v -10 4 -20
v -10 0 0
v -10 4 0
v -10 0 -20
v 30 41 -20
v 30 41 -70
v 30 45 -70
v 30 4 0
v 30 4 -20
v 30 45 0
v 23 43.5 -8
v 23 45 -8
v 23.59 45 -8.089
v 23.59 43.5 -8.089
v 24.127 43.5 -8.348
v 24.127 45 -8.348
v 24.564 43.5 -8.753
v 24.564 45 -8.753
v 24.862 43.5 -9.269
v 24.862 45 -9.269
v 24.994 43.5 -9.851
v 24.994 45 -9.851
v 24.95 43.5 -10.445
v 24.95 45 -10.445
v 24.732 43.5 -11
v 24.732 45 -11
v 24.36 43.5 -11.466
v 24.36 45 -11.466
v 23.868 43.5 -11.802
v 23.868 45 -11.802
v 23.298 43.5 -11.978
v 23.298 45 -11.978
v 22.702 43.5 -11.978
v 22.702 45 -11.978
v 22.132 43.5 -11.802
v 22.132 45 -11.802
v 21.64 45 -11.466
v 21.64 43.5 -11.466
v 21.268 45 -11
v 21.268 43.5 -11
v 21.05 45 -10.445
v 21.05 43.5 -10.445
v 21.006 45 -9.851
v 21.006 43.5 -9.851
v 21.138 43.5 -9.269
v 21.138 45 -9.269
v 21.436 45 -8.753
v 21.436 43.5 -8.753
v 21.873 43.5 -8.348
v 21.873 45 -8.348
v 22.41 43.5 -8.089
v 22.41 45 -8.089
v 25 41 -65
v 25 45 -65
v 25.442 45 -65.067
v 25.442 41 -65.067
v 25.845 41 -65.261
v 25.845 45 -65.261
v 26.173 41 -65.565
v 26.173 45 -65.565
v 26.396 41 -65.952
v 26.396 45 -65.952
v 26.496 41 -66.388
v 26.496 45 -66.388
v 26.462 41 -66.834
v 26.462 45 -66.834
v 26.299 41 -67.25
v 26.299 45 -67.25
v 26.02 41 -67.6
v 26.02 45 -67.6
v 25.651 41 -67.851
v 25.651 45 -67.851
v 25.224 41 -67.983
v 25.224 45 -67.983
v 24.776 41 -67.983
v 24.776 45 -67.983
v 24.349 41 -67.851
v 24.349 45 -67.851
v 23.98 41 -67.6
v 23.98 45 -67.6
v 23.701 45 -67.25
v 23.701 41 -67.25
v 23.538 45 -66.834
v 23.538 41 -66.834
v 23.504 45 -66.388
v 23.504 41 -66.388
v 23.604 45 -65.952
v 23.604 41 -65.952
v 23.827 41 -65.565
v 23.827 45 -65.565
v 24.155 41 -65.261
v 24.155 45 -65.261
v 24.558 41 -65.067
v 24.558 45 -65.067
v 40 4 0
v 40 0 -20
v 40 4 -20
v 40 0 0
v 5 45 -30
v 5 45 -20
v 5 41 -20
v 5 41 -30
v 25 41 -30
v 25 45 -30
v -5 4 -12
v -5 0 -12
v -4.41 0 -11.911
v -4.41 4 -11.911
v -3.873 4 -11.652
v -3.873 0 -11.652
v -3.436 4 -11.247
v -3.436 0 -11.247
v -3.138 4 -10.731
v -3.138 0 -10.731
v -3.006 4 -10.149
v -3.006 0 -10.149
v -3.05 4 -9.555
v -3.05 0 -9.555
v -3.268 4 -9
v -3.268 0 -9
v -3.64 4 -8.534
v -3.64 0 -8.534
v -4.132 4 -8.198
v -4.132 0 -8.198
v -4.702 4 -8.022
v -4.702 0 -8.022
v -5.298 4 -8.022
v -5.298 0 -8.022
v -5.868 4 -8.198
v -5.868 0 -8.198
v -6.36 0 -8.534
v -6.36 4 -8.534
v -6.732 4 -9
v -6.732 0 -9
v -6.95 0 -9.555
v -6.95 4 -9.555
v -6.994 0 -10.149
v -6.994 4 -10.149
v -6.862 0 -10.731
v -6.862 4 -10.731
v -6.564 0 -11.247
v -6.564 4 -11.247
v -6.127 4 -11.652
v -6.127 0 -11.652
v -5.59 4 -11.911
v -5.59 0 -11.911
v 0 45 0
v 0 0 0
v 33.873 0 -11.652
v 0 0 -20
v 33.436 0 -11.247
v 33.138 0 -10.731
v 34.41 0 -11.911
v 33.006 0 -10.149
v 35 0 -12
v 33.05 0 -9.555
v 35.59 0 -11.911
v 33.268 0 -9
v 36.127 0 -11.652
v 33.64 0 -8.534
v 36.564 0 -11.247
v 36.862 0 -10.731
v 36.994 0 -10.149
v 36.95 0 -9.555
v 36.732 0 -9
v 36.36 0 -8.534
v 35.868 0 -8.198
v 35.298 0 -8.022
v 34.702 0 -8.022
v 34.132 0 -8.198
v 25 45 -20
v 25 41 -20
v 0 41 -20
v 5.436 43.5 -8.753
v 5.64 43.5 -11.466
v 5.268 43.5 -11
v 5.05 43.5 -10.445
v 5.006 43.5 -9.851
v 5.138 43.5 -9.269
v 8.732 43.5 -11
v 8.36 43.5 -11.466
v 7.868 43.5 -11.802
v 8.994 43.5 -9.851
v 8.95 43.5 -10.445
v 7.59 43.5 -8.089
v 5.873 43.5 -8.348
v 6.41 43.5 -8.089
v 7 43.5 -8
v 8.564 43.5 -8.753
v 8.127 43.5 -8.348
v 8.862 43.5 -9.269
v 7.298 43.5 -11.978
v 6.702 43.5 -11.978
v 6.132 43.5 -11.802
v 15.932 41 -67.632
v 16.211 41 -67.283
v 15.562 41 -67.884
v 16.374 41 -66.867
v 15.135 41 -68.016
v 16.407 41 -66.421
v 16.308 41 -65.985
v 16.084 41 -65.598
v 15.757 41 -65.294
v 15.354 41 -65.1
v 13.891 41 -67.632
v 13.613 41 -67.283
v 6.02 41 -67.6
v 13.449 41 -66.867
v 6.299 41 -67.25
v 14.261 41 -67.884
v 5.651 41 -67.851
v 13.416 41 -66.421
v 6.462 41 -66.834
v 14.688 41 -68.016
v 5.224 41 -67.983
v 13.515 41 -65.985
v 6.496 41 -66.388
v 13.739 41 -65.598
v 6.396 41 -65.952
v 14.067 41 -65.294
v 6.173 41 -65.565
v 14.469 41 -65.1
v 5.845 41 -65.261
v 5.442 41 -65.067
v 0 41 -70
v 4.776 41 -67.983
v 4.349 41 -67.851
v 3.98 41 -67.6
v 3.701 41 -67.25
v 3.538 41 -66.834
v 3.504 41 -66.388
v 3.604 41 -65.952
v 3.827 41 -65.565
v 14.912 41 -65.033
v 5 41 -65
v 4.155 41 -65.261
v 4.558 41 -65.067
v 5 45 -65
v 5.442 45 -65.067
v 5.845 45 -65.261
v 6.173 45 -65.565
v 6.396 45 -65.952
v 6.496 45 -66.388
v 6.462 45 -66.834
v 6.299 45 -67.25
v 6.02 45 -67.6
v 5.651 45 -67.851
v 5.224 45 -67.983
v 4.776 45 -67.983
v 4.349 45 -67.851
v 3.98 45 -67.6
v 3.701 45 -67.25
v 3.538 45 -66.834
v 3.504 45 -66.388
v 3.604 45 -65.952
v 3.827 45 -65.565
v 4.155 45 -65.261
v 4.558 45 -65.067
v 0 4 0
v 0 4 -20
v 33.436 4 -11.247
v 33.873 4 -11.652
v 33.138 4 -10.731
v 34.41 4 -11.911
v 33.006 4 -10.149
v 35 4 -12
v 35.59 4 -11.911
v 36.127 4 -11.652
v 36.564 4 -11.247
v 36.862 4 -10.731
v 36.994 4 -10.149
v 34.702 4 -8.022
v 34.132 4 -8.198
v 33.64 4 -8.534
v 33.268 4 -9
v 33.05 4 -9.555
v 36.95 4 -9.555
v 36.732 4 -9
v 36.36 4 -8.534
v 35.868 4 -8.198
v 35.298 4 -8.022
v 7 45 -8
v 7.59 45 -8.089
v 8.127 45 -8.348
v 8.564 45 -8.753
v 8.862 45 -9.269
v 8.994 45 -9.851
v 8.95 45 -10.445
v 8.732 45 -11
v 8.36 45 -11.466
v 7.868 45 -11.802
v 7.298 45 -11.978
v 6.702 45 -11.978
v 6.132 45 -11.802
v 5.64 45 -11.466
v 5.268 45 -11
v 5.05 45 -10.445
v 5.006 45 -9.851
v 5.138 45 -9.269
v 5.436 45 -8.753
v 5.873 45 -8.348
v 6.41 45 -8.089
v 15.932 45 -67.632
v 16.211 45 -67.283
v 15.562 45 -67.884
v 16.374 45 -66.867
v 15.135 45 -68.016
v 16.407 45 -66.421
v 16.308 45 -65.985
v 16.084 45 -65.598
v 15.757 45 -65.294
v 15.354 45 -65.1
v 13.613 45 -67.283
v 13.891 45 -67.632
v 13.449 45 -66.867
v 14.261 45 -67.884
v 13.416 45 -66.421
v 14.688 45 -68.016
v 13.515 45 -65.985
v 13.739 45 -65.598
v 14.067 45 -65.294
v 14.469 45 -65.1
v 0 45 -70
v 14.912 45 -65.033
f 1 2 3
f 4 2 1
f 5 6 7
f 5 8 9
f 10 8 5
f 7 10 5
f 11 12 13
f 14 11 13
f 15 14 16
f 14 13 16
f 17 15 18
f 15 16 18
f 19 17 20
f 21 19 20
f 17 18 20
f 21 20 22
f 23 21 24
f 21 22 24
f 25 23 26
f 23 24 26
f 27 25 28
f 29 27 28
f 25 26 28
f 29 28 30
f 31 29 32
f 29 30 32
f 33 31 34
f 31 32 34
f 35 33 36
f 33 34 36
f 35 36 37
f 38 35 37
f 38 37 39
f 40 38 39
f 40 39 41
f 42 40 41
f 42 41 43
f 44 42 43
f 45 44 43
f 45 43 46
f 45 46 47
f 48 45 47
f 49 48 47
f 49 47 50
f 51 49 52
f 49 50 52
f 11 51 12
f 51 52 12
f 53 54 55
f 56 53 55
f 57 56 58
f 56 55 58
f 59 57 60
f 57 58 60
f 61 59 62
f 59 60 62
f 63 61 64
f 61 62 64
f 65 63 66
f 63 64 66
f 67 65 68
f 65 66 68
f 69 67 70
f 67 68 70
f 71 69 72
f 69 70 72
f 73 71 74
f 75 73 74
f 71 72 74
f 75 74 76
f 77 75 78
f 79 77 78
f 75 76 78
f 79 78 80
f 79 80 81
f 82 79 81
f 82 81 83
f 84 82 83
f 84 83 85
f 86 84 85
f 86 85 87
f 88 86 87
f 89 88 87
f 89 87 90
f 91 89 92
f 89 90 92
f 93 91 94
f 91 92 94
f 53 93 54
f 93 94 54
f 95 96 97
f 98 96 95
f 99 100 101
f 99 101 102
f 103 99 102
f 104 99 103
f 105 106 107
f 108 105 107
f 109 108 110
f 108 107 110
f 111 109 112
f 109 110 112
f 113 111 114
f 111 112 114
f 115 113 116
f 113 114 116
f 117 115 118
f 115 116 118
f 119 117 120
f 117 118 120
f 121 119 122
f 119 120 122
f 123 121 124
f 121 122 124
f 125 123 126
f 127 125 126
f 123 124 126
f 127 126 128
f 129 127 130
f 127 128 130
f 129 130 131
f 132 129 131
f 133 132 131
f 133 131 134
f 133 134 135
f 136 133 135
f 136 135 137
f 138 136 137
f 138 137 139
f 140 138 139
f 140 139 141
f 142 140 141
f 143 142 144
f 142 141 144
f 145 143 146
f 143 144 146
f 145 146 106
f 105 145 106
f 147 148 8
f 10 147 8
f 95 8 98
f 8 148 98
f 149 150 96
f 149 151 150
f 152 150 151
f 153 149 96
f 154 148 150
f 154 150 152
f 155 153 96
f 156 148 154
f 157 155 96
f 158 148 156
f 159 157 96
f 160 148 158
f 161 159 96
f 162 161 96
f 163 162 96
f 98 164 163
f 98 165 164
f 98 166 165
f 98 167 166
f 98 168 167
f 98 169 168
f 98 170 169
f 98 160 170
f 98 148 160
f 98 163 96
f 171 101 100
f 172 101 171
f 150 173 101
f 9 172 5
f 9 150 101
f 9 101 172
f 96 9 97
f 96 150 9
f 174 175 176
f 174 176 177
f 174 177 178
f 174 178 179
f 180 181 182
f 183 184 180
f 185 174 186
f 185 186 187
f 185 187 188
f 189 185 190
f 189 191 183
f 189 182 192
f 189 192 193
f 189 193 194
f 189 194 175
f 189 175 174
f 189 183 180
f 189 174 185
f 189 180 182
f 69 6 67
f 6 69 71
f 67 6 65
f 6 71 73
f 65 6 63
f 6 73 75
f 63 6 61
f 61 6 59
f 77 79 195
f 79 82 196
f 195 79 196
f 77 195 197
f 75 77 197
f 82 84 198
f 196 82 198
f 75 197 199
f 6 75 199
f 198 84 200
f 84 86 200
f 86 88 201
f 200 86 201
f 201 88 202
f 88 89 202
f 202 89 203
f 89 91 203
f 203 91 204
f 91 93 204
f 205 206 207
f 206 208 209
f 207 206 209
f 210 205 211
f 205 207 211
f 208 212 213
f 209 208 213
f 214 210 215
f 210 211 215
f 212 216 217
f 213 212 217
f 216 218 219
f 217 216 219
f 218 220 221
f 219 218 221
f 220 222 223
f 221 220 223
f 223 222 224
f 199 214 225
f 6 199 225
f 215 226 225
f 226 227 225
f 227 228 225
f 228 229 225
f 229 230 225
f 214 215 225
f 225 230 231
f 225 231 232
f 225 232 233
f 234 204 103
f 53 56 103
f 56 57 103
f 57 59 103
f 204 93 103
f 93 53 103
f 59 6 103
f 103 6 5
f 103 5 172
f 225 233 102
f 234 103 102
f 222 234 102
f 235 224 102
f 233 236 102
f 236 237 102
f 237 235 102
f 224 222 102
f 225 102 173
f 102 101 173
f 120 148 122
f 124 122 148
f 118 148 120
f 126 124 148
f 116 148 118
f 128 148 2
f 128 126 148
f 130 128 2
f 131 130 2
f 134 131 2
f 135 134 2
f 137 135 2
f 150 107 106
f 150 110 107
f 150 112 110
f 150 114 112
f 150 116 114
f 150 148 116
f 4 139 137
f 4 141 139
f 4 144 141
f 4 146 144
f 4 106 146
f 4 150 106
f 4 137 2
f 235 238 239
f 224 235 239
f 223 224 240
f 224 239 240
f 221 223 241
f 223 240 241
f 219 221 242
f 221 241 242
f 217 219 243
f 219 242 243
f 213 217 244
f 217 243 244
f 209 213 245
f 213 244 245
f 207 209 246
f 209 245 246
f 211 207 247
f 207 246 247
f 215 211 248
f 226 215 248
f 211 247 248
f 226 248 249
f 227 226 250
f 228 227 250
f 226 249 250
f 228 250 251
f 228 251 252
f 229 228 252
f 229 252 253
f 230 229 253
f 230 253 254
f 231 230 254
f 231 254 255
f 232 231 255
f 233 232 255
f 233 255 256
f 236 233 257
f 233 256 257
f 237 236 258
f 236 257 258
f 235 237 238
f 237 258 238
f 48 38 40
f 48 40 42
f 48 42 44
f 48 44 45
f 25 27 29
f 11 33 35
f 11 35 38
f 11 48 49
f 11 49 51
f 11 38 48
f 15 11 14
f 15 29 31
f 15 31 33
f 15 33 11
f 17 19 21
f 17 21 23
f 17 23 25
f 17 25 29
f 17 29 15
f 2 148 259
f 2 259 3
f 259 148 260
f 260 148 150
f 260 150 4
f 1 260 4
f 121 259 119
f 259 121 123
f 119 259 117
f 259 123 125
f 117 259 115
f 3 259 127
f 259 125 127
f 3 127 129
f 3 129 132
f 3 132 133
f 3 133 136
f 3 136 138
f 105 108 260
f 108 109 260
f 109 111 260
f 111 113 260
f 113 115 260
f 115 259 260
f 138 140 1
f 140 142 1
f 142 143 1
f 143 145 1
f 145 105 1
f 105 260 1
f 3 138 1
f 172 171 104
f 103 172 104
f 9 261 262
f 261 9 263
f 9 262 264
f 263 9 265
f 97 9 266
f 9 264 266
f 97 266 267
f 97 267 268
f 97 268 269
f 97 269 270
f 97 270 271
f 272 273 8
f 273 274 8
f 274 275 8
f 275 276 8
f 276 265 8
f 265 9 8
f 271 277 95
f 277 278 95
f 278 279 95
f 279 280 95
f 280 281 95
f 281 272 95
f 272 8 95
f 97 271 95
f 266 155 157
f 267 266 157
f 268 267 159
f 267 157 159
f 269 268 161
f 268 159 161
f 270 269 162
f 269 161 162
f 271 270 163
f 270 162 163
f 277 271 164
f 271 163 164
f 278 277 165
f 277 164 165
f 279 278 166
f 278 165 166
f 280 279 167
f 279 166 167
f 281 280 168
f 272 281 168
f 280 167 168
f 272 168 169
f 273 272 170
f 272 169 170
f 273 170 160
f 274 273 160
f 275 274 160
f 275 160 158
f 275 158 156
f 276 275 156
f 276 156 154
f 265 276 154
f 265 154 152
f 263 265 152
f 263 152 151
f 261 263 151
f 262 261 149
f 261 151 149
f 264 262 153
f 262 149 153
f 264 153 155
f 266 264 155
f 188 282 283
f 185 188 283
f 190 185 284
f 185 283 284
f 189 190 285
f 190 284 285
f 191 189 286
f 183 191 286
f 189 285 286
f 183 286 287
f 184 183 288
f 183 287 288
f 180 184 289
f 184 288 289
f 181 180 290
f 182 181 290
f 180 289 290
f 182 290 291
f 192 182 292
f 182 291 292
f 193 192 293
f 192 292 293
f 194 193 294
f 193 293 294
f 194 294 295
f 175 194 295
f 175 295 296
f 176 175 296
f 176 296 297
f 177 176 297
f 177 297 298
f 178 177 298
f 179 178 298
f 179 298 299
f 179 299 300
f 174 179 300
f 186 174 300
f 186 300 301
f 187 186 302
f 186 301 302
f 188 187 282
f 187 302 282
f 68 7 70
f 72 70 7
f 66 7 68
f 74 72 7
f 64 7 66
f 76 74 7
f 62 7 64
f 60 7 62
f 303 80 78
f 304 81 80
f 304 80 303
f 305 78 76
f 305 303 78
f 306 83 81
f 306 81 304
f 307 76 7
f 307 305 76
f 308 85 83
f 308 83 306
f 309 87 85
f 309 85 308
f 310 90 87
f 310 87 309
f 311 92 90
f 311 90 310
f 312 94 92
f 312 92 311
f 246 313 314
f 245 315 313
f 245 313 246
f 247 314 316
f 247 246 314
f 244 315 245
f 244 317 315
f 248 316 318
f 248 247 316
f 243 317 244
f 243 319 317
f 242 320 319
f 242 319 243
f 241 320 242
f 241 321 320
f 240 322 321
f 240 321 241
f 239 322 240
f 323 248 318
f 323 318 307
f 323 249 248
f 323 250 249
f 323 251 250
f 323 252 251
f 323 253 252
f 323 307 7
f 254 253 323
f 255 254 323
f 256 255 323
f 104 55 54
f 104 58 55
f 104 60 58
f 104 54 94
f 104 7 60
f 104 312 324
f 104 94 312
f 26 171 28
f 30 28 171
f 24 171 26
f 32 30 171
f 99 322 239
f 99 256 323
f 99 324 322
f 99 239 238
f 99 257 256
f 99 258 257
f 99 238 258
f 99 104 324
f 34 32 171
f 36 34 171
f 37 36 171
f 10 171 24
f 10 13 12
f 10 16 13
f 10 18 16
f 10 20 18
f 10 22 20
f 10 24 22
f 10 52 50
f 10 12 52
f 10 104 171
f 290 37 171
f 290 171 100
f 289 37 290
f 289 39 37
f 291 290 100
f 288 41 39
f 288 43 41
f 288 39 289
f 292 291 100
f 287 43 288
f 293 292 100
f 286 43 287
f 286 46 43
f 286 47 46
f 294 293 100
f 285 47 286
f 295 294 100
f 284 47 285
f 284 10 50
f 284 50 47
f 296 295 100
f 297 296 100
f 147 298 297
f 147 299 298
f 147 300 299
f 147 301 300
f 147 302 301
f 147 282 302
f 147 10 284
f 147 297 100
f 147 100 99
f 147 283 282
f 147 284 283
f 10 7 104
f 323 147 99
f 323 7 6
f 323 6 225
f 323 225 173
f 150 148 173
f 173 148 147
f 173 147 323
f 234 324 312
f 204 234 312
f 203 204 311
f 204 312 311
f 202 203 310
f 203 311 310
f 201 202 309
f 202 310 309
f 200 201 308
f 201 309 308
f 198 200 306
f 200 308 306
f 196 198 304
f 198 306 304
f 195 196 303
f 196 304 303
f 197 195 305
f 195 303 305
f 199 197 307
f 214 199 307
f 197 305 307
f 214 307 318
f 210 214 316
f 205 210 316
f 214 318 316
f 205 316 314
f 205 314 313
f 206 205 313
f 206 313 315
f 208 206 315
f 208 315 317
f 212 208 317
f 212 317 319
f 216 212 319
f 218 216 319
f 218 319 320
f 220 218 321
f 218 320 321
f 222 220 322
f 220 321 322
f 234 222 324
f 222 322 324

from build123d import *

# Parameters (mm, degrees)
SKETCH1_W           = 30
SKETCH1_H           = 20
BOSS_EXTRUDE1_DEPTH = 45
SKETCH3_W           = 10
SKETCH3_H           = 20
BOSS_EXTRUDE2_DEPTH = 4
SKETCH4_W           = 10
SKETCH4_H           = 20
BOSS_EXTRUDE3_DEPTH = 4
SKETCH5_R           = 2
CUT_EXTRUDE2_DEPTH  = 4
SKETCH8_R           = 2
CUT_EXTRUDE3_DEPTH  = 1.5
SKETCH9_W           = 30
SKETCH9_H           = 4
BOSS_EXTRUDE4_DEPTH = 50
SKETCH10_W          = 20
SKETCH10_H          = 10
CUT_EXTRUDE4_DEPTH  = 4
SKETCH11_R          = 1.5
CUT_EXTRUDE5_DEPTH  = 4


with BuildPart() as part:
    # Sketch1 → Boss-Extrude1 (new body)
    with BuildSketch(Plane(origin=(0, 0, 0), x_dir=(1, 0, 0), z_dir=(0, 1, 0))):
        with Locations((15, 10)):
            Rectangle(SKETCH1_W, SKETCH1_H)
    extrude(amount=BOSS_EXTRUDE1_DEPTH)

    # Sketch3 → Boss-Extrude2 (add)
    with BuildSketch(Plane.XZ):
        with Locations((35, -10)):
            Rectangle(SKETCH3_W, SKETCH3_H)
    extrude(amount=-BOSS_EXTRUDE2_DEPTH)


with BuildPart() as body_2:
    # Sketch4 → Boss-Extrude3 (new body)
    with BuildSketch(Plane(origin=(0, 0, 0), x_dir=(-1, 0, 0), z_dir=(0, -1, 0))):
        with Locations((5, 10)):
            Rectangle(SKETCH4_W, SKETCH4_H)
    extrude(amount=-BOSS_EXTRUDE3_DEPTH)


with BuildPart() as cut_extrude2_tool:
    # Sketch5 → Cut-Extrude2 (new body)
    with BuildSketch(Plane.XZ):
        with Locations(Location((35, -10, 0), (0, 0, 270))):
            Circle(SKETCH5_R)
        with Locations(Location((-5, -10, 0), (0, 0, 270))):
            Circle(SKETCH5_R)
    extrude(amount=-CUT_EXTRUDE2_DEPTH)


with BuildPart() as part_1:
    add(part.part)

    # Cut-Extrude2: cut by cut_extrude2_tool
    add(cut_extrude2_tool.part, mode=Mode.SUBTRACT)

    # Sketch8 → Cut-Extrude3 (cut)
    with BuildSketch(Plane(origin=(0, 45, 0), x_dir=(1, 0, 0), z_dir=(0, 1, 0))):
        with Locations(Location((7, 10, 0), (0, 0, 270))):
            Circle(SKETCH8_R)
        with Locations(Location((23, 10, 0), (0, 0, 270))):
            Circle(SKETCH8_R)
    extrude(amount=-CUT_EXTRUDE3_DEPTH, mode=Mode.SUBTRACT)

    # Sketch9 → Boss-Extrude4 (add)
    with BuildSketch(Plane(origin=(0, 0, -20), x_dir=(-1, 0, 0), z_dir=(0, 0, -1))):
        with Locations((-15, 43)):
            Rectangle(SKETCH9_W, SKETCH9_H)
    extrude(amount=BOSS_EXTRUDE4_DEPTH)

    # Sketch10 → Cut-Extrude4 (cut)
    with BuildSketch(Plane(origin=(0, 45, 0), x_dir=(1, 0, 0), z_dir=(0, 1, 0))):
        with Locations((15, 25)):
            Rectangle(SKETCH10_W, SKETCH10_H)
    extrude(amount=-CUT_EXTRUDE4_DEPTH, mode=Mode.SUBTRACT)

    # Sketch11 → Cut-Extrude5 (cut)
    with BuildSketch(Plane(origin=(0, 45, 0), x_dir=(1, 0, 0), z_dir=(0, 1, 0))):
        with Locations(Location((25, 66.5, 0), (0, 0, 270))):
            Circle(SKETCH11_R)
        with Locations(Location((14.911615562, 66.532901833, 0), (0, 0, 270))):
            Circle(SKETCH11_R)
        with Locations(Location((5, 66.5, 0), (0, 0, 270))):
            Circle(SKETCH11_R)
    extrude(amount=-CUT_EXTRUDE5_DEPTH, mode=Mode.SUBTRACT)


with BuildPart() as body_2_1:
    add(body_2.part)

    # Cut-Extrude2: cut by cut_extrude2_tool
    add(cut_extrude2_tool.part, mode=Mode.SUBTRACT)


solid = Compound([part_1.part, body_2_1.part])
